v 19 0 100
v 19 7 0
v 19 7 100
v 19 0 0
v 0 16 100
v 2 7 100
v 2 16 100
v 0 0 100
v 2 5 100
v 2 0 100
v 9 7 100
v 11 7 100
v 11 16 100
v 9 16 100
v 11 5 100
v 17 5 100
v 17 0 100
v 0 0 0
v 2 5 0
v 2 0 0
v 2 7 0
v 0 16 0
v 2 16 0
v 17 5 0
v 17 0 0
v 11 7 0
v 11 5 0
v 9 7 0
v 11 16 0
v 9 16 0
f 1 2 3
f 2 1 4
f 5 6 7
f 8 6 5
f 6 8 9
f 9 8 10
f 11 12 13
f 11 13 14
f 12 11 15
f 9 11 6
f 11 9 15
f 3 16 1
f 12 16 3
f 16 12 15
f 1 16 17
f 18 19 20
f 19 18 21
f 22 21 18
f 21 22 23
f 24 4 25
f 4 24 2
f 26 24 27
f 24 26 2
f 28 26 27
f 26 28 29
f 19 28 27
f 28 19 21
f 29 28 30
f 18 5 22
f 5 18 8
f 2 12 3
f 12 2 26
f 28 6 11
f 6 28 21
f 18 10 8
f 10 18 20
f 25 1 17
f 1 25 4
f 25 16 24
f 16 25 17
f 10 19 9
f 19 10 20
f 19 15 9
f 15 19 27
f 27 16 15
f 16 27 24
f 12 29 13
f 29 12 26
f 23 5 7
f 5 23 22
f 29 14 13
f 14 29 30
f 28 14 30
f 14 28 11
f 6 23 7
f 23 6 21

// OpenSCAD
wall_thickness = 2;
tray_height = 7;
tray_width = 15;
clip_height = 11;
clip_width = 7;
holder_length = 100;

module marker_holder() {
  union() {
    difference() {
      cube([tray_width + 2 * wall_thickness, tray_height, holder_length]);
      translate([wall_thickness, -wall_thickness, -wall_thickness / 2]) {
        cube([tray_width, tray_height, holder_length + wall_thickness]);
      }
    }
    translate([0, 5, 0]) {
      difference() {
        cube([clip_width + 2 * wall_thickness, clip_height, holder_length]);
        translate([wall_thickness, wall_thickness, -wall_thickness / 2]) {
          cube([clip_width, clip_height, holder_length + wall_thickness]);
        }
      }
    }
  }
}

marker_holder();
